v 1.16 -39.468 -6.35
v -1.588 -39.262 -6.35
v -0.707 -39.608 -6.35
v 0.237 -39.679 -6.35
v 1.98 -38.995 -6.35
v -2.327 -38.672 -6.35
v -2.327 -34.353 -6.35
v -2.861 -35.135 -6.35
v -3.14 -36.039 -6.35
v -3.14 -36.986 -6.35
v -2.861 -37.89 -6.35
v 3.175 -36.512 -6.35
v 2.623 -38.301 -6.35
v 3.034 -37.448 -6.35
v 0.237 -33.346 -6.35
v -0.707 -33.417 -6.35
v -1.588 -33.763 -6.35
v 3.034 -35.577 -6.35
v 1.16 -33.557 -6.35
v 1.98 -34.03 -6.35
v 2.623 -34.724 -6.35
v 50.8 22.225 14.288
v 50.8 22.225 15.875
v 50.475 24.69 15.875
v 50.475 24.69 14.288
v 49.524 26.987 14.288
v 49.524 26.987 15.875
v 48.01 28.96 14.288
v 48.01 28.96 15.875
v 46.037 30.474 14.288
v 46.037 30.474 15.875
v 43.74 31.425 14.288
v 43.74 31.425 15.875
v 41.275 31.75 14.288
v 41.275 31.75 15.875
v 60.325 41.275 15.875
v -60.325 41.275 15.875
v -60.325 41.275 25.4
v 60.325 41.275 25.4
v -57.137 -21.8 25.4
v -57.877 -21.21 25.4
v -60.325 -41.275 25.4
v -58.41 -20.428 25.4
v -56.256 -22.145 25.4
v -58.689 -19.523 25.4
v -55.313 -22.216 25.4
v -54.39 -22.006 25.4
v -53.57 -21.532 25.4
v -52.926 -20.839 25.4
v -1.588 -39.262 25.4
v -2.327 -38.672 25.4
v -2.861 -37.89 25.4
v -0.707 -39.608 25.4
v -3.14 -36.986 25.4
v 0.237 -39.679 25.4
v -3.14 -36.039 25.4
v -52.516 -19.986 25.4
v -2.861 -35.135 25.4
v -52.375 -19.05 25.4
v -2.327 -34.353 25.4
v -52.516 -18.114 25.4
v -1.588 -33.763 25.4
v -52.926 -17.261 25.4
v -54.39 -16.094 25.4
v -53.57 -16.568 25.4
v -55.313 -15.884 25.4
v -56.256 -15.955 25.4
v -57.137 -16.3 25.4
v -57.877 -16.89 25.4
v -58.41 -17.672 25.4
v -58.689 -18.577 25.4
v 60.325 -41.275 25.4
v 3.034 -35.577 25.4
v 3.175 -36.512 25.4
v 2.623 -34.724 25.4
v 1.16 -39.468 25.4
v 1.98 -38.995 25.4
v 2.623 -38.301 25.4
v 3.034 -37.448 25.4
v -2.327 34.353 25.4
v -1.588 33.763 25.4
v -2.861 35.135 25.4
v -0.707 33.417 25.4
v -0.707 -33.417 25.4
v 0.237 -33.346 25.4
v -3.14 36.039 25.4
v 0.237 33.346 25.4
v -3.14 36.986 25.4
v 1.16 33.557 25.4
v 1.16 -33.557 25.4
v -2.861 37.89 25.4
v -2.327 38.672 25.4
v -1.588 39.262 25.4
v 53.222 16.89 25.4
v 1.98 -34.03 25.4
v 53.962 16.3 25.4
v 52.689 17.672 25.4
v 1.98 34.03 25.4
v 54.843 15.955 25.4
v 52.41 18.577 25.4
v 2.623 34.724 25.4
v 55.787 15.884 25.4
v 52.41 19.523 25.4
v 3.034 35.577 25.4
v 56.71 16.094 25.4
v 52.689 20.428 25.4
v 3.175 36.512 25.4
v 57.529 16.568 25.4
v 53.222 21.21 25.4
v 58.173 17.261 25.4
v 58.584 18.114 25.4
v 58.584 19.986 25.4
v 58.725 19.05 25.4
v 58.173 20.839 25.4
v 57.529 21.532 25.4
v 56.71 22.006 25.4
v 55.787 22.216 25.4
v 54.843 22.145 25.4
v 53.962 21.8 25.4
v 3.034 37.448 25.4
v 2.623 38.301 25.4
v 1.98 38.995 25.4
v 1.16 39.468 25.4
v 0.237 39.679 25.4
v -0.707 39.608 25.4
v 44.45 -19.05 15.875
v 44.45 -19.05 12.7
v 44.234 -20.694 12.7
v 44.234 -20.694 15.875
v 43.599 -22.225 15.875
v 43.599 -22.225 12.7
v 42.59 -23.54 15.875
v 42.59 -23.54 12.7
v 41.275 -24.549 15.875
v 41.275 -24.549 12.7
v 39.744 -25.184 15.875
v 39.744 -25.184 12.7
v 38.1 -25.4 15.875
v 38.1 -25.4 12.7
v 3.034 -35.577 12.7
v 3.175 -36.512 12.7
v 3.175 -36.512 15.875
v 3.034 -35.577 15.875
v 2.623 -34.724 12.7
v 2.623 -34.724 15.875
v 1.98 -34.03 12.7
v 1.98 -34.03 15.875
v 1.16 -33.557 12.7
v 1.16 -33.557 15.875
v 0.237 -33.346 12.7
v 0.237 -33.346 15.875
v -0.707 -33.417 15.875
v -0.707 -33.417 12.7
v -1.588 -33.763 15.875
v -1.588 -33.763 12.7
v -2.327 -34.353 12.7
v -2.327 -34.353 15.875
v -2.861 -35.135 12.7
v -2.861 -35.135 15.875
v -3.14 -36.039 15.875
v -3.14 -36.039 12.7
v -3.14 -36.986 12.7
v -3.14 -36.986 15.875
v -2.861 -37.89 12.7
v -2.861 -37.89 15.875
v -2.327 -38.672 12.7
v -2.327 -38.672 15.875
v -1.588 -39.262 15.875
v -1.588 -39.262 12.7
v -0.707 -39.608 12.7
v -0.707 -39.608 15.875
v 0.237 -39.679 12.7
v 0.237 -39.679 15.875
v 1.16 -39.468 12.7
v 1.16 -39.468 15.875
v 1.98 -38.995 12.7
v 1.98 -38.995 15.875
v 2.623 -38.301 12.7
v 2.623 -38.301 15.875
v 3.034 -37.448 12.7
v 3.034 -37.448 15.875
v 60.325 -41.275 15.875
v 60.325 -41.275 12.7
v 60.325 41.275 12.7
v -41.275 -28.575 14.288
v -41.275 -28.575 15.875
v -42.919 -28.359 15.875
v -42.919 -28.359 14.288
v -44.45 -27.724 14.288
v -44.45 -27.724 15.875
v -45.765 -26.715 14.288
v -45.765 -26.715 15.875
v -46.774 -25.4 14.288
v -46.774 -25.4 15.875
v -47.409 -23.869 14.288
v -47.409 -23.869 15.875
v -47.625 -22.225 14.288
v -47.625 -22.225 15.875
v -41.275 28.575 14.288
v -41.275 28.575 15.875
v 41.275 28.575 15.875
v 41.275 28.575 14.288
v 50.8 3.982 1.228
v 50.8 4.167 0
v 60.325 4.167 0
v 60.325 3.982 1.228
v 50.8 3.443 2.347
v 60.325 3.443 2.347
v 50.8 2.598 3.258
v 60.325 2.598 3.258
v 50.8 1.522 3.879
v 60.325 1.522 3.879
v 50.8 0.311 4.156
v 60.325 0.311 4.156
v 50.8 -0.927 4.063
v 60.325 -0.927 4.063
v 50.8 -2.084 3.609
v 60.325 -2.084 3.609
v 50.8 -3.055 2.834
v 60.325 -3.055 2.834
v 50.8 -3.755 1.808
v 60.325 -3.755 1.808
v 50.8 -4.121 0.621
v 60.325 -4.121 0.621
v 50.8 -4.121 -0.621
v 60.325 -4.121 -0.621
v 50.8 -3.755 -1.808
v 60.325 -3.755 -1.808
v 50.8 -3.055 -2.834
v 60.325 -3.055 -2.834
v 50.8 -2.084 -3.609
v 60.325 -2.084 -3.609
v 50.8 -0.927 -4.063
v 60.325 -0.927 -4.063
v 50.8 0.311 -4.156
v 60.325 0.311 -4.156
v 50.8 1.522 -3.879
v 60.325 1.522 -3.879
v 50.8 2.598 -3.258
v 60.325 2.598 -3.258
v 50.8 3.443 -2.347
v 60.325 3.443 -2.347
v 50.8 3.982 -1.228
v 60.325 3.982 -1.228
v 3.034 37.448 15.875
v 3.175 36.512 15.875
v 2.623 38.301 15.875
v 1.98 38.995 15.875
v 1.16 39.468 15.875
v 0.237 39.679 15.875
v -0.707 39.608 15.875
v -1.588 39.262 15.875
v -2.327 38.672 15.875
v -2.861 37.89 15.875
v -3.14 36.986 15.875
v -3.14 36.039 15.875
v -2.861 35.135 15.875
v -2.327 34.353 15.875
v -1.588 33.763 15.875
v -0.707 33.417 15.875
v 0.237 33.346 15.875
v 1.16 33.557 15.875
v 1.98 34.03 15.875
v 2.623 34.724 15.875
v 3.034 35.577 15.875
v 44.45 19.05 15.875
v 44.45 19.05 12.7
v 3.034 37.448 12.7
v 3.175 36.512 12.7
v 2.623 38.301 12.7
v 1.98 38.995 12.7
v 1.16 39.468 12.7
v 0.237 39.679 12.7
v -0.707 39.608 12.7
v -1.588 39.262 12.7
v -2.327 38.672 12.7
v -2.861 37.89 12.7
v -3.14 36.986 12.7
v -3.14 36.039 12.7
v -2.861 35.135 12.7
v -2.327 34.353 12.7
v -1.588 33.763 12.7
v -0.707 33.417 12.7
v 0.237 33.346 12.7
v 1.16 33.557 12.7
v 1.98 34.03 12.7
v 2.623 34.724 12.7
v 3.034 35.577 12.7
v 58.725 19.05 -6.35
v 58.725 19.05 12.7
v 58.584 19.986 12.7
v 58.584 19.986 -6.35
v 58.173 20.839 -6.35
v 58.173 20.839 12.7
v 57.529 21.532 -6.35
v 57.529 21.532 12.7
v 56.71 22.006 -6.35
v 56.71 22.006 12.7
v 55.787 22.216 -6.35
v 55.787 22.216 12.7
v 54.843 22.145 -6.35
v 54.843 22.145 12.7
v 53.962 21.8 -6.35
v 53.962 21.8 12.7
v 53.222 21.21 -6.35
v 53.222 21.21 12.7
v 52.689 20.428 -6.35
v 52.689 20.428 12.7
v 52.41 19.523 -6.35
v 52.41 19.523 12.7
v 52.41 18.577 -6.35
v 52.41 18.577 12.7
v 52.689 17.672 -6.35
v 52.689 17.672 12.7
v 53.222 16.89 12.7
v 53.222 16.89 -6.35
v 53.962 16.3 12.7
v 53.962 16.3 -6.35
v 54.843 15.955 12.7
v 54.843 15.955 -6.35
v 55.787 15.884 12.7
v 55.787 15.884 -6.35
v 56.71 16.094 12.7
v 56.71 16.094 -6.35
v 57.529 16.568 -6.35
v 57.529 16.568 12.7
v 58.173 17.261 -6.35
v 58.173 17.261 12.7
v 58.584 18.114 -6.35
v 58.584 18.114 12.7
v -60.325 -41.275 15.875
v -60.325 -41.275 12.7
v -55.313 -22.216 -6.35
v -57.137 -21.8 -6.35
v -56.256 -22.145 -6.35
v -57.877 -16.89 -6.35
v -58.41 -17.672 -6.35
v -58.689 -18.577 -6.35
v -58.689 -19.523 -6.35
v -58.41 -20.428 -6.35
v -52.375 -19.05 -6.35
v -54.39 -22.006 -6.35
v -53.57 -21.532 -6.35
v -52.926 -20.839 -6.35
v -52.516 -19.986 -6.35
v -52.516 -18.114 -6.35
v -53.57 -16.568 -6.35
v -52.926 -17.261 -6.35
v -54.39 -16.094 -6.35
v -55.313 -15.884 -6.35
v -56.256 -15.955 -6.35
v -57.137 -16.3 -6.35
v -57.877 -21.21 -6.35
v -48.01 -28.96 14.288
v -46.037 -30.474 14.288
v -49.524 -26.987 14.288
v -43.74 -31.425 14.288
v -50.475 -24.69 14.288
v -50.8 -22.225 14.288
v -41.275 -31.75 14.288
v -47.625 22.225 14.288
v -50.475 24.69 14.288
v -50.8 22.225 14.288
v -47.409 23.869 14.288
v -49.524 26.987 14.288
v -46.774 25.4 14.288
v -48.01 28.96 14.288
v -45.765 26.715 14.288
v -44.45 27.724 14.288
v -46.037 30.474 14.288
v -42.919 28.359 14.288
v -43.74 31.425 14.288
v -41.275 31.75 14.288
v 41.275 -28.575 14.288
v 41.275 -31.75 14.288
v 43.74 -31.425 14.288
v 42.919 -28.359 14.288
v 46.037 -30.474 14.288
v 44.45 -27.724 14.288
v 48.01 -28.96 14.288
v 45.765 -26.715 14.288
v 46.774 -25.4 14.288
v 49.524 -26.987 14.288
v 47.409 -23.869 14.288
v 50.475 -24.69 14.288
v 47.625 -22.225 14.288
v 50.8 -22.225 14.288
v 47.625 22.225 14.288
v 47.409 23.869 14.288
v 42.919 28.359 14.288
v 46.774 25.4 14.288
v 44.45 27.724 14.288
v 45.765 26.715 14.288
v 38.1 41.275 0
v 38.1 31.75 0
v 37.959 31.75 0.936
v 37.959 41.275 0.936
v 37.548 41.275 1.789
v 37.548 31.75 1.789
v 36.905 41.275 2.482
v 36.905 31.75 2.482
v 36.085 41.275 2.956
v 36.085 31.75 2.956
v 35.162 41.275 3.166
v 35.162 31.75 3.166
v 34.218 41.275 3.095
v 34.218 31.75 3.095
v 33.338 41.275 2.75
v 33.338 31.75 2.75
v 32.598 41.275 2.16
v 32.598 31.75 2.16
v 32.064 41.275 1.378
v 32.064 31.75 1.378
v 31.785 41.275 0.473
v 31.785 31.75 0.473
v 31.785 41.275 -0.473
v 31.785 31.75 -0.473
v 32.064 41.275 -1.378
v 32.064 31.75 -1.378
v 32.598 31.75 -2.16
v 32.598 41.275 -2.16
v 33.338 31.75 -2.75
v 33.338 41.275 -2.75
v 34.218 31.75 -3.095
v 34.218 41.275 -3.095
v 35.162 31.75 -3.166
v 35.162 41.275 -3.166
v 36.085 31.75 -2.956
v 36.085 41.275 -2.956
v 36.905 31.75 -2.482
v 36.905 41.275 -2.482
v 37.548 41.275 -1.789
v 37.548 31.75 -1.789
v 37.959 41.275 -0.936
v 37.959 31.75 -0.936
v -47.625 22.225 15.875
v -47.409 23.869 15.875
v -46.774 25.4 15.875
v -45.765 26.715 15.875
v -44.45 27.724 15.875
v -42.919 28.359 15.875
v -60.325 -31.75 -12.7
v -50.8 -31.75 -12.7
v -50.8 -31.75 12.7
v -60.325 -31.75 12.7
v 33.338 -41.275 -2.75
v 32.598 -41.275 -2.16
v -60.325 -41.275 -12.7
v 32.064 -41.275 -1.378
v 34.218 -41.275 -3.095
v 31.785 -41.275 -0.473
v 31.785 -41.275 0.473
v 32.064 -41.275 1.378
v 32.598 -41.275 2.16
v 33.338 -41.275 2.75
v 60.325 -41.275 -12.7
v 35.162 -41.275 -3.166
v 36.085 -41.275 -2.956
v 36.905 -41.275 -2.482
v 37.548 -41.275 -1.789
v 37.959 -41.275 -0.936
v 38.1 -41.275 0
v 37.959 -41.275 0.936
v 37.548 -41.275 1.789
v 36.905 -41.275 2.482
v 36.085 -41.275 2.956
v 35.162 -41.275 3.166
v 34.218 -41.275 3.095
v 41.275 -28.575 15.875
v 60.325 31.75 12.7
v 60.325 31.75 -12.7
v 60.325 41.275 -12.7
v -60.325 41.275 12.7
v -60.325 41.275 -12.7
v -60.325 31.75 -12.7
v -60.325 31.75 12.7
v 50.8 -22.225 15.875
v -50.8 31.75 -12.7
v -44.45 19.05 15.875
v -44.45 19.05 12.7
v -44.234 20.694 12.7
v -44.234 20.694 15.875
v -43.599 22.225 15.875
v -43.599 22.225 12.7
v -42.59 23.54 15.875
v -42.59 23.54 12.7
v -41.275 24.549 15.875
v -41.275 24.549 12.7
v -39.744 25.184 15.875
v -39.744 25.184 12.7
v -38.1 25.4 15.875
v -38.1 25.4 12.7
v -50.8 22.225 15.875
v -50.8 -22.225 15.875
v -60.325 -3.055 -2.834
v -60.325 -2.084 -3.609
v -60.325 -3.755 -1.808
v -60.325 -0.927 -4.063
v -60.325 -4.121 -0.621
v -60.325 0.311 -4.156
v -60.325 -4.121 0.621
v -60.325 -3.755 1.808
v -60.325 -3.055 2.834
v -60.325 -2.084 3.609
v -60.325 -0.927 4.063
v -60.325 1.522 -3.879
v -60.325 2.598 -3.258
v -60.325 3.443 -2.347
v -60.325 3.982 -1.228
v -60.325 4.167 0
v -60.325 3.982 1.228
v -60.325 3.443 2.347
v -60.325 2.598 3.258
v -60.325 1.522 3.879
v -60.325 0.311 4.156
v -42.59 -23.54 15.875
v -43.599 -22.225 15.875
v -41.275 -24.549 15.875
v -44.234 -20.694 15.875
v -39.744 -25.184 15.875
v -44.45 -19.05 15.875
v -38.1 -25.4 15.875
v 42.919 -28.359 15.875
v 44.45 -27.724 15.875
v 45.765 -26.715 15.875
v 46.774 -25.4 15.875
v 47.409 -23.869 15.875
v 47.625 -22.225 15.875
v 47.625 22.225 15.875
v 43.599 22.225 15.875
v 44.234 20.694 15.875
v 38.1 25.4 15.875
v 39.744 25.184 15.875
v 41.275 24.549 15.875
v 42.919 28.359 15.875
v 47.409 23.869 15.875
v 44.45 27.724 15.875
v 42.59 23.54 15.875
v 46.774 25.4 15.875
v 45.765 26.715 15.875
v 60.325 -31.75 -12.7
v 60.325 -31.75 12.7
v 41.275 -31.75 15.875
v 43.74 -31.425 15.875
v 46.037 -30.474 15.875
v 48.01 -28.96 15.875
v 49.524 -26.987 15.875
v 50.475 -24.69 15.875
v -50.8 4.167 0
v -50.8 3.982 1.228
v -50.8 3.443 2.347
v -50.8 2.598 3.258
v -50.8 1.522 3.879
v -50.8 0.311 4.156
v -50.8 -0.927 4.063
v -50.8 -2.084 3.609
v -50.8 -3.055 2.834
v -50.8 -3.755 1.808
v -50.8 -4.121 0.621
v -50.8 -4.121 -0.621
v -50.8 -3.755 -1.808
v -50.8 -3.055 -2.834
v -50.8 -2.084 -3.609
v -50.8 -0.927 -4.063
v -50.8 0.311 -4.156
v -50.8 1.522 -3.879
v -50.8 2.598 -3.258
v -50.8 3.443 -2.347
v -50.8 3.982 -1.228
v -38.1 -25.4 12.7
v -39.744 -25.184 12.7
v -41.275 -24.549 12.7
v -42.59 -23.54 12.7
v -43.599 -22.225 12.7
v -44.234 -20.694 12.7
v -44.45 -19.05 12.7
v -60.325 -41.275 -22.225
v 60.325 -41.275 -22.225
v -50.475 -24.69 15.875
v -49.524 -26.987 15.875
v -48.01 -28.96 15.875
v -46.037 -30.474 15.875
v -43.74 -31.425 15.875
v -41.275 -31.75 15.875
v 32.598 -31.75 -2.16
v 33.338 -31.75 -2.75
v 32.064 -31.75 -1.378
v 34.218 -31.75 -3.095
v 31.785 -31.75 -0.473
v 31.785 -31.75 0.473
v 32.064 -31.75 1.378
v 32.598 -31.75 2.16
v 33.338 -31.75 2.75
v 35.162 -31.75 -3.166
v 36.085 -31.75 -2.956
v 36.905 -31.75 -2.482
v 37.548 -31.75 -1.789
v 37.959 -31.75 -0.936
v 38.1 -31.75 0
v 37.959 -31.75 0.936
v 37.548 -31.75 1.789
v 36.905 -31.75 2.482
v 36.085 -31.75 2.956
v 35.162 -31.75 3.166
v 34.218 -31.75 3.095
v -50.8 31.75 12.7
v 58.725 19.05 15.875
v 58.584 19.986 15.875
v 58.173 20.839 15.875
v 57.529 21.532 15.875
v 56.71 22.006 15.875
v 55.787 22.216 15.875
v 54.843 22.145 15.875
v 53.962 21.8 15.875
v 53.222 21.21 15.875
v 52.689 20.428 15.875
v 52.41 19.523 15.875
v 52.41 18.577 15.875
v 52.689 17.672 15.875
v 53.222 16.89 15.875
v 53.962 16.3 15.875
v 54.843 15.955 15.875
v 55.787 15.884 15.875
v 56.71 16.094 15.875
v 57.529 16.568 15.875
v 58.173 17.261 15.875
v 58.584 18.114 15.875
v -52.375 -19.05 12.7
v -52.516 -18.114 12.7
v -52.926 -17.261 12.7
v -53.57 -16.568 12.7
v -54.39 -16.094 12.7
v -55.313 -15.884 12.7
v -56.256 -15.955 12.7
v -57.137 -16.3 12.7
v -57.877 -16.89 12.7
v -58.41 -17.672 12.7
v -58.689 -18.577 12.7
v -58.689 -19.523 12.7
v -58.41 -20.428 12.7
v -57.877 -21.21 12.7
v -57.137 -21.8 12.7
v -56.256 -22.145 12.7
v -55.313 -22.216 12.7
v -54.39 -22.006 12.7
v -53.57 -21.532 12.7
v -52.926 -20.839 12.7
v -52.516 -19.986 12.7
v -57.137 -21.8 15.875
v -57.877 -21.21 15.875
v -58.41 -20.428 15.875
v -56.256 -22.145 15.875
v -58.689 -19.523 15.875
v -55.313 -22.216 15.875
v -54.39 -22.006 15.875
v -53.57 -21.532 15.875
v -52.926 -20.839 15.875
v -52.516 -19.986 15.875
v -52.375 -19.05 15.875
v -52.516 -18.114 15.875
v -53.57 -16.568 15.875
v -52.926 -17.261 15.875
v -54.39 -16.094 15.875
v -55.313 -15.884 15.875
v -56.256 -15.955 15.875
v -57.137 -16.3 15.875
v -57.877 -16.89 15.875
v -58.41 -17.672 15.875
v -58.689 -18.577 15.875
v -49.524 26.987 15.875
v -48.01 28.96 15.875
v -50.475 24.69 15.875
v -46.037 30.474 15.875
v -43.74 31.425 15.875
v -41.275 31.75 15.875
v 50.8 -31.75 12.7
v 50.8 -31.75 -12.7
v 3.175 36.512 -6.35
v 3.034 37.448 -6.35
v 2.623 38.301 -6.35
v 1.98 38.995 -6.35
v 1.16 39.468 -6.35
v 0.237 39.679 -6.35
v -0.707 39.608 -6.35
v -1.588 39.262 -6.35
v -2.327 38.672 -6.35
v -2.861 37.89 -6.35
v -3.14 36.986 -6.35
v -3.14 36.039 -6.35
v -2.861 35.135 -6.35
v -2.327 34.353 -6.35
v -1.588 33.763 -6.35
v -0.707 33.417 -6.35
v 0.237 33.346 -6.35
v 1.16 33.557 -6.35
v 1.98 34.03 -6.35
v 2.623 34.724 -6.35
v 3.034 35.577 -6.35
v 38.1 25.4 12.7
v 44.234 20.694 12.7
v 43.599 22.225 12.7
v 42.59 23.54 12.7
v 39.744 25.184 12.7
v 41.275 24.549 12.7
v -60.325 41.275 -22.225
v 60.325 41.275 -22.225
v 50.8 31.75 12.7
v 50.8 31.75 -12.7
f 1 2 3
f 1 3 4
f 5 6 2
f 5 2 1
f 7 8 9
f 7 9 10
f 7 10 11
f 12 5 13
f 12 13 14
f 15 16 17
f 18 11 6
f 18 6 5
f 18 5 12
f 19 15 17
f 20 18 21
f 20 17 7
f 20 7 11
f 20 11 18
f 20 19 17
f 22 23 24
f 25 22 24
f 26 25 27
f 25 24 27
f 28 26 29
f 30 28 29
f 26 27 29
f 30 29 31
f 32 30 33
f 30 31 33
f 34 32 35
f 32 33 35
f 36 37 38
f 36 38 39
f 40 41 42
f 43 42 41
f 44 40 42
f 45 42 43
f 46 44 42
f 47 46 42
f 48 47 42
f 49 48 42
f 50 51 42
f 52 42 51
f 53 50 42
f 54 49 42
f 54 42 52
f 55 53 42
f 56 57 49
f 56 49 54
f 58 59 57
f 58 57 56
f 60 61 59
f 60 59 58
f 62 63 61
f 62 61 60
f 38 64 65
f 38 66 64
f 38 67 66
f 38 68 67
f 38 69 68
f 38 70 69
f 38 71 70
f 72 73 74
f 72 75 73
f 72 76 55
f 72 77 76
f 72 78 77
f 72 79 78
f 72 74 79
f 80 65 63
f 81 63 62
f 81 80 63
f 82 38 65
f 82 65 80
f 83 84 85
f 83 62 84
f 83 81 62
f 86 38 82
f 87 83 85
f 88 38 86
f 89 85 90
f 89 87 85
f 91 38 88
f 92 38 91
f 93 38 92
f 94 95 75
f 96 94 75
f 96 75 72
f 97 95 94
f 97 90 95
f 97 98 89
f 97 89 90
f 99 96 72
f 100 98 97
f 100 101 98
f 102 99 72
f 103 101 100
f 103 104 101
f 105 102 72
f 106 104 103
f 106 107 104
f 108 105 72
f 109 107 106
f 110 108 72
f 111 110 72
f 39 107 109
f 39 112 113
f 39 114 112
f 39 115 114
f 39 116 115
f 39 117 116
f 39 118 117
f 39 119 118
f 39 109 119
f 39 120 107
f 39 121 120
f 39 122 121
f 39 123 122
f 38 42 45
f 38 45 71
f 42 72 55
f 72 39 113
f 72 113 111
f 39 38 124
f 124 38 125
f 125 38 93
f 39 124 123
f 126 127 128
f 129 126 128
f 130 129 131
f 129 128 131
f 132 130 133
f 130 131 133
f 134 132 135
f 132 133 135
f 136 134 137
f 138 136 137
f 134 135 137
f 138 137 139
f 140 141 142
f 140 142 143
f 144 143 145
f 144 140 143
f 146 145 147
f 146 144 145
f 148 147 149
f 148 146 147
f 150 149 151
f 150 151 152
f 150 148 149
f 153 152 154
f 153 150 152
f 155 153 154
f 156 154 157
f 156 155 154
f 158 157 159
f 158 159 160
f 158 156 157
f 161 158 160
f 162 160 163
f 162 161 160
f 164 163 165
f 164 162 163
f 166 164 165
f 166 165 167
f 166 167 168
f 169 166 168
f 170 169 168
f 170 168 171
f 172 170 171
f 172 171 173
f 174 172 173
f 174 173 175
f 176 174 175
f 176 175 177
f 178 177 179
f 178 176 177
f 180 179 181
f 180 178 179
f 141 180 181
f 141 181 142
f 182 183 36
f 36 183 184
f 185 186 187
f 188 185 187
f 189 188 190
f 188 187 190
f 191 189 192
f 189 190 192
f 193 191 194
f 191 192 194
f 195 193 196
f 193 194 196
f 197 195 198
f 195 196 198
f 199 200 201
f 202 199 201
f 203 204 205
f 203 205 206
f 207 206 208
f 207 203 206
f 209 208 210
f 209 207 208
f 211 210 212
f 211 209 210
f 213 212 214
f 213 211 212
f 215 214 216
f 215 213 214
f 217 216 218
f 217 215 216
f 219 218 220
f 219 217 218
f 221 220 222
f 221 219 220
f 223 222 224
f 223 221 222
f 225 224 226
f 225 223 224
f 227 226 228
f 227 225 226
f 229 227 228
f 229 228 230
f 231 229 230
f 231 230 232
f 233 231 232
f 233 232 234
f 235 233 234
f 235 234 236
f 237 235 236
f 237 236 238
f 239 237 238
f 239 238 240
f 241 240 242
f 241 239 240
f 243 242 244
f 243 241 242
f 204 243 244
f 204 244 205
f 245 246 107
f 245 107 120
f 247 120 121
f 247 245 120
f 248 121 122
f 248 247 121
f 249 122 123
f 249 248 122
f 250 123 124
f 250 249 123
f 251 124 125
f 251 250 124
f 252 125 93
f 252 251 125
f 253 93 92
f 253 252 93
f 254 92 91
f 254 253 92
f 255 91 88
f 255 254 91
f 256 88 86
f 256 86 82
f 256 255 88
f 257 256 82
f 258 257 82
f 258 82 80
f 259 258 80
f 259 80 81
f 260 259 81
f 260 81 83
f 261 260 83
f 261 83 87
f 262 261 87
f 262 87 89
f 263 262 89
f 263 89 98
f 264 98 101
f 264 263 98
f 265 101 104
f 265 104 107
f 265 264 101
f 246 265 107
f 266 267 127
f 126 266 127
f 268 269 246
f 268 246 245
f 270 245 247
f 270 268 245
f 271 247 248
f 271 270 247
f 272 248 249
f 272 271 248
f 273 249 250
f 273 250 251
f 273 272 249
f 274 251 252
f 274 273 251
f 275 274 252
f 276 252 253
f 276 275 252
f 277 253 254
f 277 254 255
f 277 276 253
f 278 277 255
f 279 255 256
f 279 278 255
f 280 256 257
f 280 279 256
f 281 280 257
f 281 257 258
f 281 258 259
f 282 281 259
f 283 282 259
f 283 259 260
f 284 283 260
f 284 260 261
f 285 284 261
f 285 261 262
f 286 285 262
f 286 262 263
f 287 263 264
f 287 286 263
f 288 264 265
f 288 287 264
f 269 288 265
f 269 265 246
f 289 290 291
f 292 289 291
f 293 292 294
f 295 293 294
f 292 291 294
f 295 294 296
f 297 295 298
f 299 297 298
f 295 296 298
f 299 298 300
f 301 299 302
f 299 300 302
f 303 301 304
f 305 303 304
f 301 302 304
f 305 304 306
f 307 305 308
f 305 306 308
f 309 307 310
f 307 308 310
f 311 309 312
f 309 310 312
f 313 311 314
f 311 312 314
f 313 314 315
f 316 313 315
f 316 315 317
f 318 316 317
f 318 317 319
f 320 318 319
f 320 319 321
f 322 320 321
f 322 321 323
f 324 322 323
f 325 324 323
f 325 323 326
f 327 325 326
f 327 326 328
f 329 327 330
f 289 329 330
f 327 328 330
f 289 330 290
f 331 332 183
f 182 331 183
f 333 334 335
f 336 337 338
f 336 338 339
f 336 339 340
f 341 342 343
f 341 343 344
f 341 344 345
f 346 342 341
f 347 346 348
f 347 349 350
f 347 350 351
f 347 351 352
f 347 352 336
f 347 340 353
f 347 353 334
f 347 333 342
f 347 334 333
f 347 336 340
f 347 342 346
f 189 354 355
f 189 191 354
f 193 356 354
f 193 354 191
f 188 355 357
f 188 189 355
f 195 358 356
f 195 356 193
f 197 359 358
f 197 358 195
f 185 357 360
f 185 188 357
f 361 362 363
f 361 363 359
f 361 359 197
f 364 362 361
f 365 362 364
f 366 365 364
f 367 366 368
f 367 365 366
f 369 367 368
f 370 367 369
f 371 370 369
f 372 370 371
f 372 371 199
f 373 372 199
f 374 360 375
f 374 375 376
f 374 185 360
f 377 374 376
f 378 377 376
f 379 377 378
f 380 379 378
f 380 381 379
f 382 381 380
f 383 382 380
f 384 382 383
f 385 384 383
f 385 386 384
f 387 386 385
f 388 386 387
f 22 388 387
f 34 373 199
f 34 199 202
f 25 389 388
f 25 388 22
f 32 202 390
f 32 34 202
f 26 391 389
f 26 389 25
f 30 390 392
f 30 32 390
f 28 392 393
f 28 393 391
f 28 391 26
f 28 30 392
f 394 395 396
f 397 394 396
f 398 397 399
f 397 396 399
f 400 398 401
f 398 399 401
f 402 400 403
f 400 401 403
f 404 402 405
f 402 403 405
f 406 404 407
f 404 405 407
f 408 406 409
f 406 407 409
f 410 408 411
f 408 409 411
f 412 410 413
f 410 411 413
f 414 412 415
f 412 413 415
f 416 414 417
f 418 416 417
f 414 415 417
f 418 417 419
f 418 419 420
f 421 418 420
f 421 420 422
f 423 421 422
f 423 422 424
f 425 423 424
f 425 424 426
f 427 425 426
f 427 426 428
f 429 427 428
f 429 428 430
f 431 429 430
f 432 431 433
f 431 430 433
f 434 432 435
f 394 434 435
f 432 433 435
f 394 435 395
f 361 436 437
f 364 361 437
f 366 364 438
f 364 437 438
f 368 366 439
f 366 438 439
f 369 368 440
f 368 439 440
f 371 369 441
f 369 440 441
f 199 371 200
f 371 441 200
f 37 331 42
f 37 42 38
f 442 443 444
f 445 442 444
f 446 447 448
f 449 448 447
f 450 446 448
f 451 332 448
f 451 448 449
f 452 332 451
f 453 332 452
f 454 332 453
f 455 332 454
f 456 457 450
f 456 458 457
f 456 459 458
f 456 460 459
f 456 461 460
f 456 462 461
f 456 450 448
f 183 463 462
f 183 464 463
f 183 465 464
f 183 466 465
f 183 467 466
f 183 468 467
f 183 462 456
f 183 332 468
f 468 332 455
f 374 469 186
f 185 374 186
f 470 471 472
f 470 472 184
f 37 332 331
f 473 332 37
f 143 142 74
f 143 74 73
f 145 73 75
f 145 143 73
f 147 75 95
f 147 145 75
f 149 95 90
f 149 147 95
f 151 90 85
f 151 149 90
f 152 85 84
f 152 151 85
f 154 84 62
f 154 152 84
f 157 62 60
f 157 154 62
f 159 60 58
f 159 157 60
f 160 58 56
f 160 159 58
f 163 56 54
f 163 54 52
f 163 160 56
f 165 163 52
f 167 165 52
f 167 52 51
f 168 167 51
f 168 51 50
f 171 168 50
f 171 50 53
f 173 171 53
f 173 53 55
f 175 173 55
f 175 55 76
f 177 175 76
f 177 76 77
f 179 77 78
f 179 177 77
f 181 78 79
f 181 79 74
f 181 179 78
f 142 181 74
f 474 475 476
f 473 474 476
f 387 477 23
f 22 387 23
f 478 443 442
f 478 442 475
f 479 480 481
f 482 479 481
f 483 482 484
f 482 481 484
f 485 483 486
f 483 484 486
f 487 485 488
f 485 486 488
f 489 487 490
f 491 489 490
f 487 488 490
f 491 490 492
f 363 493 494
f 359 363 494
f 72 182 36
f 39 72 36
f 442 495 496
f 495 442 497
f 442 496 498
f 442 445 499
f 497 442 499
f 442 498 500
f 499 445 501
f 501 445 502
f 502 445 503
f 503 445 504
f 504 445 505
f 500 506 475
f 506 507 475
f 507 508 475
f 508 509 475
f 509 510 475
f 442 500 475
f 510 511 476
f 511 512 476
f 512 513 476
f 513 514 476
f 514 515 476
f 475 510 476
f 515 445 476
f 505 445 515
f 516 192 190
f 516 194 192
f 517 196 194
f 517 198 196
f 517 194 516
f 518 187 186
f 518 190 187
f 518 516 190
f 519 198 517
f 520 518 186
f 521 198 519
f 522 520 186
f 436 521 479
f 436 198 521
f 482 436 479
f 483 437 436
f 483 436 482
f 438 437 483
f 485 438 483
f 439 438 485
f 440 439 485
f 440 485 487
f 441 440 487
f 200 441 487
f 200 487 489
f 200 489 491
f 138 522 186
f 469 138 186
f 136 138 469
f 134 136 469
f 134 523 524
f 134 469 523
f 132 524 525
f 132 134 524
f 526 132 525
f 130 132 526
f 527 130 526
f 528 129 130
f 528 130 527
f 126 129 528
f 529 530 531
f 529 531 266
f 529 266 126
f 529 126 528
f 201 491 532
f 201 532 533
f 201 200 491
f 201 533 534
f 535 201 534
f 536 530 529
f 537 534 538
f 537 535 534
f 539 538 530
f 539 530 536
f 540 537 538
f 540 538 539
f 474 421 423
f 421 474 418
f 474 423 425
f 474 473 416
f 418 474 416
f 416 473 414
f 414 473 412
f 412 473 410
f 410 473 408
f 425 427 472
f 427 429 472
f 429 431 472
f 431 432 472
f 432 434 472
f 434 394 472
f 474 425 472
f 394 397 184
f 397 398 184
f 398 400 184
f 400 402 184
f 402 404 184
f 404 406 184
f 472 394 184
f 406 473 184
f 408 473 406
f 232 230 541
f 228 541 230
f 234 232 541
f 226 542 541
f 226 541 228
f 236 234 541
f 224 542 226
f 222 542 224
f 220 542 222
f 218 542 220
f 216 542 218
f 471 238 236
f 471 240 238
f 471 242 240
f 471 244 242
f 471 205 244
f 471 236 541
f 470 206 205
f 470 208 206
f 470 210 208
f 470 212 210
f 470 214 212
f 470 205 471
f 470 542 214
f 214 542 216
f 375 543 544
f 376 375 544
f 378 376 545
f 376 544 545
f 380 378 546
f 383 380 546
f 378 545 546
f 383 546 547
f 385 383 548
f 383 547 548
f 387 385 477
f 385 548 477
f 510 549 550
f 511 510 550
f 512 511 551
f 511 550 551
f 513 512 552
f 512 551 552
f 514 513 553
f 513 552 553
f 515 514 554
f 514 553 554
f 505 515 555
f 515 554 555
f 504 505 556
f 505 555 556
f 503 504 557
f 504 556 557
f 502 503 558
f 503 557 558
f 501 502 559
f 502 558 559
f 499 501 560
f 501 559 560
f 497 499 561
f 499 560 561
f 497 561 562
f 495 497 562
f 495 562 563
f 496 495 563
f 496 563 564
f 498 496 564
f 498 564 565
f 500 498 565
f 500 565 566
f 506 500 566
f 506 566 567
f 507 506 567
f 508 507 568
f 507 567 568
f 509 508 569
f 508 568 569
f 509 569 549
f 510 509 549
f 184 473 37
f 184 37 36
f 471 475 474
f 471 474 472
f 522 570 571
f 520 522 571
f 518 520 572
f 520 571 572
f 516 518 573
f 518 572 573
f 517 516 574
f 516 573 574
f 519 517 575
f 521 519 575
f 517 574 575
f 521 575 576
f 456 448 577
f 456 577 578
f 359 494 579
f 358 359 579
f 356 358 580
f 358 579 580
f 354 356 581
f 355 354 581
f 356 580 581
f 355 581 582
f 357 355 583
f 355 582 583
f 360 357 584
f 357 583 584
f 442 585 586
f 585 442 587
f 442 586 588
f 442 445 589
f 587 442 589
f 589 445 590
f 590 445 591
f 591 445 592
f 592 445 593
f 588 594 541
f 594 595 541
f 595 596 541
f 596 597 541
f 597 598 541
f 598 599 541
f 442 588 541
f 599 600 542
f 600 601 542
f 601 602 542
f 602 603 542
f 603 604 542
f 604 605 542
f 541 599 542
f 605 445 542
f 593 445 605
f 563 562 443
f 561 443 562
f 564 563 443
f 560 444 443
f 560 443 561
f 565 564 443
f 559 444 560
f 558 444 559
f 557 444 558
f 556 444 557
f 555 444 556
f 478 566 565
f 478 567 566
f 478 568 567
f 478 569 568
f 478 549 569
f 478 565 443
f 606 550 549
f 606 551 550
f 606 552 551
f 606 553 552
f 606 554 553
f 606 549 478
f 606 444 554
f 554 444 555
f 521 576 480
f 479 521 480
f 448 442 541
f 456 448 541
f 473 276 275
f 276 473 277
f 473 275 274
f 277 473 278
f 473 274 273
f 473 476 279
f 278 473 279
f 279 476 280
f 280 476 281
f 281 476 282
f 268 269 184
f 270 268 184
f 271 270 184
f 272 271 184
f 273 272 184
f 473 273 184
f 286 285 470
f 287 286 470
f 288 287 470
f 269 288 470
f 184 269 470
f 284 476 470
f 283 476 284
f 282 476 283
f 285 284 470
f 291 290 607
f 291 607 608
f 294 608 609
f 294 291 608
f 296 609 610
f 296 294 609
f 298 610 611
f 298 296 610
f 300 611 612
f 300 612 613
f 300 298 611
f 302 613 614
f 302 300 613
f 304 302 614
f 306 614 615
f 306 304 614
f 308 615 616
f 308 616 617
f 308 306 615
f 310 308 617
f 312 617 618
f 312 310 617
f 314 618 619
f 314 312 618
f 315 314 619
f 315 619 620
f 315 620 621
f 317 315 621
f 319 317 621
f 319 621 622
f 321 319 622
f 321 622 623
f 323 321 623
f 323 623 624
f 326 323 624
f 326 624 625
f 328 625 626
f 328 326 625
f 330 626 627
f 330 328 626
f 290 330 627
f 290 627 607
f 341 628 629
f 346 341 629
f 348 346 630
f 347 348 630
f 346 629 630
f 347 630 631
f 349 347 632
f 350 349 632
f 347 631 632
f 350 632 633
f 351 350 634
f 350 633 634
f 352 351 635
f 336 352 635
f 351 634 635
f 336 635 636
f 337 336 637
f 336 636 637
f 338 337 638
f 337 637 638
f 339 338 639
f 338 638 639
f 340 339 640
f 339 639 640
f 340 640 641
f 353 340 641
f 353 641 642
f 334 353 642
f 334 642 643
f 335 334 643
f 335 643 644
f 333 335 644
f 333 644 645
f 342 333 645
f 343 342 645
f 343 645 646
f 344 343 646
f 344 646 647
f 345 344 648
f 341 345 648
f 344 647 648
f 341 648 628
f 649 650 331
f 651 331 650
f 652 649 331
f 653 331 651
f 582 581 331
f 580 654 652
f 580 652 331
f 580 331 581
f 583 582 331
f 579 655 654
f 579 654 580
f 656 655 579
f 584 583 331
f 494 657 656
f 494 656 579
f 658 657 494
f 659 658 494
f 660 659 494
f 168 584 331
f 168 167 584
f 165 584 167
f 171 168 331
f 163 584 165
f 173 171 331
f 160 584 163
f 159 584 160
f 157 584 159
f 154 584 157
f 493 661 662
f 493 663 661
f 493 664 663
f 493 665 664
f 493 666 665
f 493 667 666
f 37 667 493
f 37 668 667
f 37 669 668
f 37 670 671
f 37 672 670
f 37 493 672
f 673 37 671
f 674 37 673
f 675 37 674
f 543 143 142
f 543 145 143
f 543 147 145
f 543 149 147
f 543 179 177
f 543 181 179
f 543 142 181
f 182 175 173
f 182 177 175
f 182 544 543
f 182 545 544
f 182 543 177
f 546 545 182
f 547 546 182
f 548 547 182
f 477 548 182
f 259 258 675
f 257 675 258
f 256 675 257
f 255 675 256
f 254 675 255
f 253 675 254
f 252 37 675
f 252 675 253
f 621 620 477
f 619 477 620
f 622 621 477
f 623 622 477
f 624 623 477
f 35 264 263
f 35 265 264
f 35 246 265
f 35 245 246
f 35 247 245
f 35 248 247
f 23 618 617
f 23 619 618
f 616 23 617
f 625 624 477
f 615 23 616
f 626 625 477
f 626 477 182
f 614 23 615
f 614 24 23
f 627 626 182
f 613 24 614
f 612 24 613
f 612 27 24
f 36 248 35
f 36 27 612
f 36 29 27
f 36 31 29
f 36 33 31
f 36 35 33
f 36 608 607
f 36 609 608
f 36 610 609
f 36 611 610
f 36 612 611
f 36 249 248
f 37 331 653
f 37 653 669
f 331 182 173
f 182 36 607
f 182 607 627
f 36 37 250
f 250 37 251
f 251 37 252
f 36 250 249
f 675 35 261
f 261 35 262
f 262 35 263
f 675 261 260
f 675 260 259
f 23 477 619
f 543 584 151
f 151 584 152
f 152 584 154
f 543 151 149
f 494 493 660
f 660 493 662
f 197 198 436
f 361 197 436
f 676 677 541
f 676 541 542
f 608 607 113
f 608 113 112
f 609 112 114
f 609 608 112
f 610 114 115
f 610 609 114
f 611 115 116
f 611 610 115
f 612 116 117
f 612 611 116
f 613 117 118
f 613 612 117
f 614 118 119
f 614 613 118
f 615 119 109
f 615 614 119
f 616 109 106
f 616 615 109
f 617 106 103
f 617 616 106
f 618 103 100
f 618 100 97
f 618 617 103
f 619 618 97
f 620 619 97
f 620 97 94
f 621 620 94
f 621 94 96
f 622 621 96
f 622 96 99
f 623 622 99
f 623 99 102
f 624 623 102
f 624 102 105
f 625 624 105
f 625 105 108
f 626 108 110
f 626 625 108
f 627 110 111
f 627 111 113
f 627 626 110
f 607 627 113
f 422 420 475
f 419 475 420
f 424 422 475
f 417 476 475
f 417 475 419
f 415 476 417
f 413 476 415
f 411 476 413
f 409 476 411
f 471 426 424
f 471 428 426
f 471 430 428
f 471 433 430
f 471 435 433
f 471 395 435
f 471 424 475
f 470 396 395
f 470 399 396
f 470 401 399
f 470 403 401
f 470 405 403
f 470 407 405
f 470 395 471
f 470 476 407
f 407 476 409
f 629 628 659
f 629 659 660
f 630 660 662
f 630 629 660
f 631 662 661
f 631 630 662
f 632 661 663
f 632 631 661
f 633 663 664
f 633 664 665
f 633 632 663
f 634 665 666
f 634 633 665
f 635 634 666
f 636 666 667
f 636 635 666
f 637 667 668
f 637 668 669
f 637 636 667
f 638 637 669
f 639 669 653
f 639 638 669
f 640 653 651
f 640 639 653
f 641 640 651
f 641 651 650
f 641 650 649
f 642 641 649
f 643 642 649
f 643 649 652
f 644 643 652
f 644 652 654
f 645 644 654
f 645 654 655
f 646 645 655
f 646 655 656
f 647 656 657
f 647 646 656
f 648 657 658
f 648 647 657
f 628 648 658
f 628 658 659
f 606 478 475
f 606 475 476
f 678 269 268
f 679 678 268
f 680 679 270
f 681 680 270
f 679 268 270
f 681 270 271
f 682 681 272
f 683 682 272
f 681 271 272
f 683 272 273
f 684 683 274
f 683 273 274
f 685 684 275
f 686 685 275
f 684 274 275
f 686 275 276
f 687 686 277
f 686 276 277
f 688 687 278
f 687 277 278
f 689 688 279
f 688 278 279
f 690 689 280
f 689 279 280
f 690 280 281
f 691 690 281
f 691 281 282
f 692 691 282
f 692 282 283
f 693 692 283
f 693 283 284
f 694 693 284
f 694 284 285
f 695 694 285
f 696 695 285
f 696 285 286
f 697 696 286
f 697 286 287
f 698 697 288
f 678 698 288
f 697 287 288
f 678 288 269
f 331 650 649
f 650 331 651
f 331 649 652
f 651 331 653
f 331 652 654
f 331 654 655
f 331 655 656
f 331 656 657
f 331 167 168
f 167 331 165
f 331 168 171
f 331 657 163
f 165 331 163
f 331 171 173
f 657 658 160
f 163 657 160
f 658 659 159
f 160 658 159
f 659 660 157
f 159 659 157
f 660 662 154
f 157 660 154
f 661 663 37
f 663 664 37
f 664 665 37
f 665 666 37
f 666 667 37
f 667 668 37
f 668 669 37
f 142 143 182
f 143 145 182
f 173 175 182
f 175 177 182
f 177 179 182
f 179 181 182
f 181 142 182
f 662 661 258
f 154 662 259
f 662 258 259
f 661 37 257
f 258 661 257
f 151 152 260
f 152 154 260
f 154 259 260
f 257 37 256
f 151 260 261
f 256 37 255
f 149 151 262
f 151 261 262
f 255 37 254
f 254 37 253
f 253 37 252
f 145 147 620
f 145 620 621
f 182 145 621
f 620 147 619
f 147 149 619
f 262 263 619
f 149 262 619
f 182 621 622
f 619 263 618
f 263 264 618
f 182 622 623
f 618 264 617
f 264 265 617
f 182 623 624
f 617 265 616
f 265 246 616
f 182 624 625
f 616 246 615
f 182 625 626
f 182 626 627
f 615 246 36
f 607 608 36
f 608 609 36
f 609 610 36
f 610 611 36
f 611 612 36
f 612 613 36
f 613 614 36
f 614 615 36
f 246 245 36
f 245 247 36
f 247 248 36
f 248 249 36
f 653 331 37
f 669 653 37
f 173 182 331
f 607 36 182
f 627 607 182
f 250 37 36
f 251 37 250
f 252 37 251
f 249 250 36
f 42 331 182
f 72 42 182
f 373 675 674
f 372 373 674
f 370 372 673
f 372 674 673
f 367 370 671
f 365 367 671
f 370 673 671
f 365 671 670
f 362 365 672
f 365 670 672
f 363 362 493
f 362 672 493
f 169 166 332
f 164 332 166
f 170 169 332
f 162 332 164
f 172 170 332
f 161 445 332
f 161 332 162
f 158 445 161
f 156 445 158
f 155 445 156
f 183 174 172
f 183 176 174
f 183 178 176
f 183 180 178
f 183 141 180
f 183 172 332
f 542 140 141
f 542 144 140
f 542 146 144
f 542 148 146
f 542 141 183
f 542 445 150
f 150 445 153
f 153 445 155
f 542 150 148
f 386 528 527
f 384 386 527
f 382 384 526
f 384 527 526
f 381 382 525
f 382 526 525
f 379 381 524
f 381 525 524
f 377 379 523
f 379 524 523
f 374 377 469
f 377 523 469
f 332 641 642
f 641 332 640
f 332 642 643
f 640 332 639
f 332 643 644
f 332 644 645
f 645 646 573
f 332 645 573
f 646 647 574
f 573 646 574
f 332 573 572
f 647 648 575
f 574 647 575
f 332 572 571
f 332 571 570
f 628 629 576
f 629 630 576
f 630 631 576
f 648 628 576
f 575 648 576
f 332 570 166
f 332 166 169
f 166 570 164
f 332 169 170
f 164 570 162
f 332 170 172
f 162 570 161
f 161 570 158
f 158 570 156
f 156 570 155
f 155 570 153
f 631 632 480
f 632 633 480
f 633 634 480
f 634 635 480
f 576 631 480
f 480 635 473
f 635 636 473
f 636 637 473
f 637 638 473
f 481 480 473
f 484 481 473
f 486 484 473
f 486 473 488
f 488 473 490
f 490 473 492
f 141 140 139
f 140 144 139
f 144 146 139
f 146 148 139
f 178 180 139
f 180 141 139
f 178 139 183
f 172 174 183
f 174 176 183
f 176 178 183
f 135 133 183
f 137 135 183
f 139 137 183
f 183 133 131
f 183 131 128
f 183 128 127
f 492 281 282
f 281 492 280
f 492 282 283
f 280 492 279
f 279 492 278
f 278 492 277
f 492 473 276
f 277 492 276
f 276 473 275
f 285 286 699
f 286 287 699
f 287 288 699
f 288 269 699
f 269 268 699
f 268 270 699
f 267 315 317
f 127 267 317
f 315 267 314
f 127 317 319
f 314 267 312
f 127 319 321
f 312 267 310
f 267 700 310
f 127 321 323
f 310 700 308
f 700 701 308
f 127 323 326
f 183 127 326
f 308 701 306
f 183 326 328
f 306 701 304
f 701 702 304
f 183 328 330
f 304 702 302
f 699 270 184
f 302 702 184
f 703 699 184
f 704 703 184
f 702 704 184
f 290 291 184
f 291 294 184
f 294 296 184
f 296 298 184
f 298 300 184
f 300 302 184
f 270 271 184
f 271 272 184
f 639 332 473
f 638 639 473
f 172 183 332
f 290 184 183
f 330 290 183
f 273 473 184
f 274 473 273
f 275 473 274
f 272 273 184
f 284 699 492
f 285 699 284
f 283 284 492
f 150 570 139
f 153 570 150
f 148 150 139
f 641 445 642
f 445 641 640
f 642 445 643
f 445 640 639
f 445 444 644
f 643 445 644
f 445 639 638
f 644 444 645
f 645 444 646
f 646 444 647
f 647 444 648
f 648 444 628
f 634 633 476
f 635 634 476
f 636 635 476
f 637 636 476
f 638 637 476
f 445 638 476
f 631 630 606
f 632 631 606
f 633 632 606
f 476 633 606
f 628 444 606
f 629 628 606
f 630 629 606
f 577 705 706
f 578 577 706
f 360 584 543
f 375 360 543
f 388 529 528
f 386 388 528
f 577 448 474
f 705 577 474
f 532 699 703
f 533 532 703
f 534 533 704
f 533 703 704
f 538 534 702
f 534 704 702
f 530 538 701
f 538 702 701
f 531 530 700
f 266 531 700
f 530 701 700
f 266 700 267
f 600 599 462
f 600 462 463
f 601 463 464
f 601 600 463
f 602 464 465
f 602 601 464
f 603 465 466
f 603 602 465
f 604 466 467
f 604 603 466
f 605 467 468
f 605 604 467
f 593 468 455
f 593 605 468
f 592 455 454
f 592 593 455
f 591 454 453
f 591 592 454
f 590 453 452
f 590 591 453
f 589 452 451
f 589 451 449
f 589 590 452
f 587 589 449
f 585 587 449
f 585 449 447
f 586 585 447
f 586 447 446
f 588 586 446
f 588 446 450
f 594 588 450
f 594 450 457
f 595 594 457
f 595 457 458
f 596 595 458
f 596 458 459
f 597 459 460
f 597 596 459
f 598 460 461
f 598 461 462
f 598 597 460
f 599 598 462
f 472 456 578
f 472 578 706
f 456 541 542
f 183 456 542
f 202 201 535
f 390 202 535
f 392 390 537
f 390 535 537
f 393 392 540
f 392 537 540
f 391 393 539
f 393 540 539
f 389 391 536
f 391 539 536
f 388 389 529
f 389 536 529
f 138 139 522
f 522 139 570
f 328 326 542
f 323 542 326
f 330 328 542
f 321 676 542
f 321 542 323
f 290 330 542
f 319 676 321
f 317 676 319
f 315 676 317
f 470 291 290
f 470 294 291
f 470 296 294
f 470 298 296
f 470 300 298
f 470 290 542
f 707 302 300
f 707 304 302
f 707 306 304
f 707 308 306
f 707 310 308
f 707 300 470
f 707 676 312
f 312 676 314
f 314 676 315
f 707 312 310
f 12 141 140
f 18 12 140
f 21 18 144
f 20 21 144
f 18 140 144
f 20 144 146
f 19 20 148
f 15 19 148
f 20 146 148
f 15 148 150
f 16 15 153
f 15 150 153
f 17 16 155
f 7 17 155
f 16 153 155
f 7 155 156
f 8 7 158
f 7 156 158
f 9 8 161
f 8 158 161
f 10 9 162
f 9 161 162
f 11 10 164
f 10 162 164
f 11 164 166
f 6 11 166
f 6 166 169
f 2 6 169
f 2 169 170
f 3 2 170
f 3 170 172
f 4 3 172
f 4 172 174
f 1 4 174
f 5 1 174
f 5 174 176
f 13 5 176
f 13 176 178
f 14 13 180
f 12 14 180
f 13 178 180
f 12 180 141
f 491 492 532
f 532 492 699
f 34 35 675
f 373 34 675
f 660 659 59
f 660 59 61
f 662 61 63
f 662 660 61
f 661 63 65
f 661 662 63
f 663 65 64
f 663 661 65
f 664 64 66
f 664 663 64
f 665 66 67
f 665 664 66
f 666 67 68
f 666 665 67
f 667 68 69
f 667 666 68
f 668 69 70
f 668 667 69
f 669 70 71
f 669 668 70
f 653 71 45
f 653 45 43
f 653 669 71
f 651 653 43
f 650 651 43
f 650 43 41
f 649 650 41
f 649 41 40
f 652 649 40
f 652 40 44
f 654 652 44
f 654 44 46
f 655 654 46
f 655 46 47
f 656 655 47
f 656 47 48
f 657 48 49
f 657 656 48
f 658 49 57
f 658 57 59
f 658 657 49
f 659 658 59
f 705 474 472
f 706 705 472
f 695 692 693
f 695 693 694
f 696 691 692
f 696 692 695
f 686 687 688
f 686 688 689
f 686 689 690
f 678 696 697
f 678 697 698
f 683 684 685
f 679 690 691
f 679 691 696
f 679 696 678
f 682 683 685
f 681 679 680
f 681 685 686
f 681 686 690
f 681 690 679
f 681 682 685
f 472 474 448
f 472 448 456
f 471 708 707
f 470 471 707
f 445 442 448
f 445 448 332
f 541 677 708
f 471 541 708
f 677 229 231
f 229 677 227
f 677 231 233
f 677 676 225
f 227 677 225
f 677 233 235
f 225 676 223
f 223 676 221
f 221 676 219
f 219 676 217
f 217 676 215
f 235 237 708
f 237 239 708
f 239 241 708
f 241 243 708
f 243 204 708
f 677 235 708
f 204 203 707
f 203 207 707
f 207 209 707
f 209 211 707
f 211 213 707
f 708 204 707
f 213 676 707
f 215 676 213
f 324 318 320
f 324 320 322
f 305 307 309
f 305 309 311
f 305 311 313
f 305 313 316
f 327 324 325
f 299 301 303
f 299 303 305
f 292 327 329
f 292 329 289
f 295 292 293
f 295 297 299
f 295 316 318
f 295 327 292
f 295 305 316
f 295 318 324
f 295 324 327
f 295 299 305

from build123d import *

# Parameters (mm, degrees)
F10_W     = 120.65
F10_H     = 82.55
F11_DEPTH = 9.525
F6_W      = 63.5
F6_H      = 25.4
F6_R      = 4.1671875
F12_DEPTH = 9.525
F8_W      = 120.65
F8_H      = 25.4
F8_R      = 3.175
F14_DEPTH = 9.525
F16_W     = 120.65
F16_H     = 82.55
F16_R     = 3.175
F17_DEPTH = 3.175
F19_DEPTH = 1.5875
F20_W     = 120.65
F20_H     = 82.55
F20_R     = 3.175
F21_DEPTH = 9.525
F22_R     = 3.175
F23_DEPTH = 19.05
F24_R     = 3.175
F25_DEPTH = 19.05
F26_R     = 3.175
F27_DEPTH = 19.05
F28_R     = 3.175
F29_DEPTH = 19.05


with BuildPart() as f11:
    # F10 (on offset) → F11 (new body)
    with BuildSketch(Plane.XY.offset(-12.7)):
        Rectangle(F10_W, F10_H)
    extrude(amount=-F11_DEPTH)


with BuildPart() as f12:
    # F6 (on offset) → F12 (new body)
    with BuildSketch(Plane.YZ.offset(-50.8)):
        Rectangle(F6_W, F6_H)
        Circle(F6_R, mode=Mode.SUBTRACT)
    extrude(amount=-F12_DEPTH)


with BuildPart() as f13_1:
    # F13: instance of F12
    add(f12.part.mirror(Plane.YZ))

    # F26 (on offset) → F27 (cut)
    with BuildSketch(Plane.XY.offset(12.7)):
        with Locations((55.5498, 19.05)):
            Circle(F26_R)
    extrude(amount=-F27_DEPTH, mode=Mode.SUBTRACT)


with BuildPart() as f14:
    # F8 (on offset) → F14 (new body)
    with BuildSketch(Plane.XZ.offset(31.75)):
        Rectangle(F8_W, F8_H)
        with Locations((34.925, 0)):
            Circle(F8_R, mode=Mode.SUBTRACT)
    extrude(amount=F14_DEPTH)


with BuildPart() as f15_1:
    # F15: instance of F14
    add(f14.part.mirror(Plane.XZ))

    # F28 (on offset) → F29 (cut)
    with BuildSketch(Plane.XY.offset(12.7)):
        with Locations((0, 36.5125)):
            Circle(F28_R)
    extrude(amount=-F29_DEPTH, mode=Mode.SUBTRACT)


with BuildPart() as f17:
    # F16 (on offset) → F17 (new body)
    with BuildSketch(Plane.XY.offset(12.7)):
        Rectangle(F16_W, F16_H)
        with Locations((-55.5498, -19.05)):
            Circle(F16_R, mode=Mode.SUBTRACT)
        with Locations((0, -36.5125)):
            Circle(F16_R, mode=Mode.SUBTRACT)
        with BuildLine():
            Line((-44.45, -19.05), (-44.45, 19.05))
            ThreePointArc((-44.45, 19.05), (-42.5901280605, 23.5401280605), (-38.1, 25.4))
            Line((-38.1, 25.4), (38.1, 25.4))
            ThreePointArc((38.1, 25.4), (42.5901280605, 23.5401280605), (44.45, 19.05))
            Line((44.45, 19.05), (44.45, -19.05))
            ThreePointArc((44.45, -19.05), (42.5901280605, -23.5401280605), (38.1, -25.4))
            Line((38.1, -25.4), (-38.1, -25.4))
            ThreePointArc((-38.1, -25.4), (-42.5901280605, -23.5401280605), (-44.45, -19.05))
        make_face(mode=Mode.SUBTRACT)
        with Locations((55.5498, 19.05)):
            Circle(F16_R, mode=Mode.SUBTRACT)
        with Locations((0, 36.5125)):
            Circle(F16_R, mode=Mode.SUBTRACT)
    extrude(amount=F17_DEPTH)

    # F18 (on offset) → F19 (cut)
    with BuildSketch(Plane.XY.offset(15.875)):
        with BuildLine():
            Line((41.275, 31.75), (-41.275, 31.75))
            ThreePointArc((-41.275, 31.75), (-48.0101920908, 28.9601920908), (-50.8, 22.225))
            Line((-50.8, 22.225), (-50.8, -22.225))
            ThreePointArc((-50.8, -22.225), (-48.0101920908, -28.9601920908), (-41.275, -31.75))
            Line((-41.275, -31.75), (41.275, -31.75))
            ThreePointArc((41.275, -31.75), (48.0101920908, -28.9601920908), (50.8, -22.225))
            Line((50.8, -22.225), (50.8, 22.225))
            ThreePointArc((50.8, 22.225), (48.0101920908, 28.9601920908), (41.275, 31.75))
        make_face()
        with BuildLine():
            ThreePointArc((-47.625, 22.225), (-45.7651280605, 26.7151280605), (-41.275, 28.575))
            Line((-41.275, 28.575), (41.275, 28.575))
            ThreePointArc((41.275, 28.575), (45.7651280605, 26.7151280605), (47.625, 22.225))
            Line((47.625, 22.225), (47.625, -22.225))
            ThreePointArc((47.625, -22.225), (45.7651280605, -26.7151280605), (41.275, -28.575))
            Line((41.275, -28.575), (-41.275, -28.575))
            ThreePointArc((-41.275, -28.575), (-45.7651280605, -26.7151280605), (-47.625, -22.225))
            Line((-47.625, -22.225), (-47.625, 22.225))
        make_face(mode=Mode.SUBTRACT)
    extrude(amount=-F19_DEPTH, mode=Mode.SUBTRACT)


with BuildPart() as f21:
    # F20 (on offset) → F21 (new body)
    with BuildSketch(Plane.XY.offset(15.875)):
        Rectangle(F20_W, F20_H)
        with Locations((-55.5498, -19.05)):
            Circle(F20_R, mode=Mode.SUBTRACT)
        with Locations((0, -36.5125)):
            Circle(F20_R, mode=Mode.SUBTRACT)
        with Locations((55.5498, 19.05)):
            Circle(F20_R, mode=Mode.SUBTRACT)
        with Locations((0, 36.5125)):
            Circle(F20_R, mode=Mode.SUBTRACT)
    extrude(amount=F21_DEPTH)


with BuildPart() as f12_1:
    add(f12.part)

    # F22 (on offset) → F23 (cut)
    with BuildSketch(Plane.XY.offset(12.7)):
        with Locations((-55.5498, -19.05)):
            Circle(F22_R)
    extrude(amount=-F23_DEPTH, mode=Mode.SUBTRACT)


with BuildPart() as f14_1:
    add(f14.part)

    # F24 (on offset) → F25 (cut)
    with BuildSketch(Plane.XY.offset(12.7)):
        with Locations((0, -36.5125)):
            Circle(F24_R)
    extrude(amount=-F25_DEPTH, mode=Mode.SUBTRACT)


solid = Compound([f11.part, f13_1.part, f15_1.part, f17.part, f21.part, f12_1.part, f14_1.part])
